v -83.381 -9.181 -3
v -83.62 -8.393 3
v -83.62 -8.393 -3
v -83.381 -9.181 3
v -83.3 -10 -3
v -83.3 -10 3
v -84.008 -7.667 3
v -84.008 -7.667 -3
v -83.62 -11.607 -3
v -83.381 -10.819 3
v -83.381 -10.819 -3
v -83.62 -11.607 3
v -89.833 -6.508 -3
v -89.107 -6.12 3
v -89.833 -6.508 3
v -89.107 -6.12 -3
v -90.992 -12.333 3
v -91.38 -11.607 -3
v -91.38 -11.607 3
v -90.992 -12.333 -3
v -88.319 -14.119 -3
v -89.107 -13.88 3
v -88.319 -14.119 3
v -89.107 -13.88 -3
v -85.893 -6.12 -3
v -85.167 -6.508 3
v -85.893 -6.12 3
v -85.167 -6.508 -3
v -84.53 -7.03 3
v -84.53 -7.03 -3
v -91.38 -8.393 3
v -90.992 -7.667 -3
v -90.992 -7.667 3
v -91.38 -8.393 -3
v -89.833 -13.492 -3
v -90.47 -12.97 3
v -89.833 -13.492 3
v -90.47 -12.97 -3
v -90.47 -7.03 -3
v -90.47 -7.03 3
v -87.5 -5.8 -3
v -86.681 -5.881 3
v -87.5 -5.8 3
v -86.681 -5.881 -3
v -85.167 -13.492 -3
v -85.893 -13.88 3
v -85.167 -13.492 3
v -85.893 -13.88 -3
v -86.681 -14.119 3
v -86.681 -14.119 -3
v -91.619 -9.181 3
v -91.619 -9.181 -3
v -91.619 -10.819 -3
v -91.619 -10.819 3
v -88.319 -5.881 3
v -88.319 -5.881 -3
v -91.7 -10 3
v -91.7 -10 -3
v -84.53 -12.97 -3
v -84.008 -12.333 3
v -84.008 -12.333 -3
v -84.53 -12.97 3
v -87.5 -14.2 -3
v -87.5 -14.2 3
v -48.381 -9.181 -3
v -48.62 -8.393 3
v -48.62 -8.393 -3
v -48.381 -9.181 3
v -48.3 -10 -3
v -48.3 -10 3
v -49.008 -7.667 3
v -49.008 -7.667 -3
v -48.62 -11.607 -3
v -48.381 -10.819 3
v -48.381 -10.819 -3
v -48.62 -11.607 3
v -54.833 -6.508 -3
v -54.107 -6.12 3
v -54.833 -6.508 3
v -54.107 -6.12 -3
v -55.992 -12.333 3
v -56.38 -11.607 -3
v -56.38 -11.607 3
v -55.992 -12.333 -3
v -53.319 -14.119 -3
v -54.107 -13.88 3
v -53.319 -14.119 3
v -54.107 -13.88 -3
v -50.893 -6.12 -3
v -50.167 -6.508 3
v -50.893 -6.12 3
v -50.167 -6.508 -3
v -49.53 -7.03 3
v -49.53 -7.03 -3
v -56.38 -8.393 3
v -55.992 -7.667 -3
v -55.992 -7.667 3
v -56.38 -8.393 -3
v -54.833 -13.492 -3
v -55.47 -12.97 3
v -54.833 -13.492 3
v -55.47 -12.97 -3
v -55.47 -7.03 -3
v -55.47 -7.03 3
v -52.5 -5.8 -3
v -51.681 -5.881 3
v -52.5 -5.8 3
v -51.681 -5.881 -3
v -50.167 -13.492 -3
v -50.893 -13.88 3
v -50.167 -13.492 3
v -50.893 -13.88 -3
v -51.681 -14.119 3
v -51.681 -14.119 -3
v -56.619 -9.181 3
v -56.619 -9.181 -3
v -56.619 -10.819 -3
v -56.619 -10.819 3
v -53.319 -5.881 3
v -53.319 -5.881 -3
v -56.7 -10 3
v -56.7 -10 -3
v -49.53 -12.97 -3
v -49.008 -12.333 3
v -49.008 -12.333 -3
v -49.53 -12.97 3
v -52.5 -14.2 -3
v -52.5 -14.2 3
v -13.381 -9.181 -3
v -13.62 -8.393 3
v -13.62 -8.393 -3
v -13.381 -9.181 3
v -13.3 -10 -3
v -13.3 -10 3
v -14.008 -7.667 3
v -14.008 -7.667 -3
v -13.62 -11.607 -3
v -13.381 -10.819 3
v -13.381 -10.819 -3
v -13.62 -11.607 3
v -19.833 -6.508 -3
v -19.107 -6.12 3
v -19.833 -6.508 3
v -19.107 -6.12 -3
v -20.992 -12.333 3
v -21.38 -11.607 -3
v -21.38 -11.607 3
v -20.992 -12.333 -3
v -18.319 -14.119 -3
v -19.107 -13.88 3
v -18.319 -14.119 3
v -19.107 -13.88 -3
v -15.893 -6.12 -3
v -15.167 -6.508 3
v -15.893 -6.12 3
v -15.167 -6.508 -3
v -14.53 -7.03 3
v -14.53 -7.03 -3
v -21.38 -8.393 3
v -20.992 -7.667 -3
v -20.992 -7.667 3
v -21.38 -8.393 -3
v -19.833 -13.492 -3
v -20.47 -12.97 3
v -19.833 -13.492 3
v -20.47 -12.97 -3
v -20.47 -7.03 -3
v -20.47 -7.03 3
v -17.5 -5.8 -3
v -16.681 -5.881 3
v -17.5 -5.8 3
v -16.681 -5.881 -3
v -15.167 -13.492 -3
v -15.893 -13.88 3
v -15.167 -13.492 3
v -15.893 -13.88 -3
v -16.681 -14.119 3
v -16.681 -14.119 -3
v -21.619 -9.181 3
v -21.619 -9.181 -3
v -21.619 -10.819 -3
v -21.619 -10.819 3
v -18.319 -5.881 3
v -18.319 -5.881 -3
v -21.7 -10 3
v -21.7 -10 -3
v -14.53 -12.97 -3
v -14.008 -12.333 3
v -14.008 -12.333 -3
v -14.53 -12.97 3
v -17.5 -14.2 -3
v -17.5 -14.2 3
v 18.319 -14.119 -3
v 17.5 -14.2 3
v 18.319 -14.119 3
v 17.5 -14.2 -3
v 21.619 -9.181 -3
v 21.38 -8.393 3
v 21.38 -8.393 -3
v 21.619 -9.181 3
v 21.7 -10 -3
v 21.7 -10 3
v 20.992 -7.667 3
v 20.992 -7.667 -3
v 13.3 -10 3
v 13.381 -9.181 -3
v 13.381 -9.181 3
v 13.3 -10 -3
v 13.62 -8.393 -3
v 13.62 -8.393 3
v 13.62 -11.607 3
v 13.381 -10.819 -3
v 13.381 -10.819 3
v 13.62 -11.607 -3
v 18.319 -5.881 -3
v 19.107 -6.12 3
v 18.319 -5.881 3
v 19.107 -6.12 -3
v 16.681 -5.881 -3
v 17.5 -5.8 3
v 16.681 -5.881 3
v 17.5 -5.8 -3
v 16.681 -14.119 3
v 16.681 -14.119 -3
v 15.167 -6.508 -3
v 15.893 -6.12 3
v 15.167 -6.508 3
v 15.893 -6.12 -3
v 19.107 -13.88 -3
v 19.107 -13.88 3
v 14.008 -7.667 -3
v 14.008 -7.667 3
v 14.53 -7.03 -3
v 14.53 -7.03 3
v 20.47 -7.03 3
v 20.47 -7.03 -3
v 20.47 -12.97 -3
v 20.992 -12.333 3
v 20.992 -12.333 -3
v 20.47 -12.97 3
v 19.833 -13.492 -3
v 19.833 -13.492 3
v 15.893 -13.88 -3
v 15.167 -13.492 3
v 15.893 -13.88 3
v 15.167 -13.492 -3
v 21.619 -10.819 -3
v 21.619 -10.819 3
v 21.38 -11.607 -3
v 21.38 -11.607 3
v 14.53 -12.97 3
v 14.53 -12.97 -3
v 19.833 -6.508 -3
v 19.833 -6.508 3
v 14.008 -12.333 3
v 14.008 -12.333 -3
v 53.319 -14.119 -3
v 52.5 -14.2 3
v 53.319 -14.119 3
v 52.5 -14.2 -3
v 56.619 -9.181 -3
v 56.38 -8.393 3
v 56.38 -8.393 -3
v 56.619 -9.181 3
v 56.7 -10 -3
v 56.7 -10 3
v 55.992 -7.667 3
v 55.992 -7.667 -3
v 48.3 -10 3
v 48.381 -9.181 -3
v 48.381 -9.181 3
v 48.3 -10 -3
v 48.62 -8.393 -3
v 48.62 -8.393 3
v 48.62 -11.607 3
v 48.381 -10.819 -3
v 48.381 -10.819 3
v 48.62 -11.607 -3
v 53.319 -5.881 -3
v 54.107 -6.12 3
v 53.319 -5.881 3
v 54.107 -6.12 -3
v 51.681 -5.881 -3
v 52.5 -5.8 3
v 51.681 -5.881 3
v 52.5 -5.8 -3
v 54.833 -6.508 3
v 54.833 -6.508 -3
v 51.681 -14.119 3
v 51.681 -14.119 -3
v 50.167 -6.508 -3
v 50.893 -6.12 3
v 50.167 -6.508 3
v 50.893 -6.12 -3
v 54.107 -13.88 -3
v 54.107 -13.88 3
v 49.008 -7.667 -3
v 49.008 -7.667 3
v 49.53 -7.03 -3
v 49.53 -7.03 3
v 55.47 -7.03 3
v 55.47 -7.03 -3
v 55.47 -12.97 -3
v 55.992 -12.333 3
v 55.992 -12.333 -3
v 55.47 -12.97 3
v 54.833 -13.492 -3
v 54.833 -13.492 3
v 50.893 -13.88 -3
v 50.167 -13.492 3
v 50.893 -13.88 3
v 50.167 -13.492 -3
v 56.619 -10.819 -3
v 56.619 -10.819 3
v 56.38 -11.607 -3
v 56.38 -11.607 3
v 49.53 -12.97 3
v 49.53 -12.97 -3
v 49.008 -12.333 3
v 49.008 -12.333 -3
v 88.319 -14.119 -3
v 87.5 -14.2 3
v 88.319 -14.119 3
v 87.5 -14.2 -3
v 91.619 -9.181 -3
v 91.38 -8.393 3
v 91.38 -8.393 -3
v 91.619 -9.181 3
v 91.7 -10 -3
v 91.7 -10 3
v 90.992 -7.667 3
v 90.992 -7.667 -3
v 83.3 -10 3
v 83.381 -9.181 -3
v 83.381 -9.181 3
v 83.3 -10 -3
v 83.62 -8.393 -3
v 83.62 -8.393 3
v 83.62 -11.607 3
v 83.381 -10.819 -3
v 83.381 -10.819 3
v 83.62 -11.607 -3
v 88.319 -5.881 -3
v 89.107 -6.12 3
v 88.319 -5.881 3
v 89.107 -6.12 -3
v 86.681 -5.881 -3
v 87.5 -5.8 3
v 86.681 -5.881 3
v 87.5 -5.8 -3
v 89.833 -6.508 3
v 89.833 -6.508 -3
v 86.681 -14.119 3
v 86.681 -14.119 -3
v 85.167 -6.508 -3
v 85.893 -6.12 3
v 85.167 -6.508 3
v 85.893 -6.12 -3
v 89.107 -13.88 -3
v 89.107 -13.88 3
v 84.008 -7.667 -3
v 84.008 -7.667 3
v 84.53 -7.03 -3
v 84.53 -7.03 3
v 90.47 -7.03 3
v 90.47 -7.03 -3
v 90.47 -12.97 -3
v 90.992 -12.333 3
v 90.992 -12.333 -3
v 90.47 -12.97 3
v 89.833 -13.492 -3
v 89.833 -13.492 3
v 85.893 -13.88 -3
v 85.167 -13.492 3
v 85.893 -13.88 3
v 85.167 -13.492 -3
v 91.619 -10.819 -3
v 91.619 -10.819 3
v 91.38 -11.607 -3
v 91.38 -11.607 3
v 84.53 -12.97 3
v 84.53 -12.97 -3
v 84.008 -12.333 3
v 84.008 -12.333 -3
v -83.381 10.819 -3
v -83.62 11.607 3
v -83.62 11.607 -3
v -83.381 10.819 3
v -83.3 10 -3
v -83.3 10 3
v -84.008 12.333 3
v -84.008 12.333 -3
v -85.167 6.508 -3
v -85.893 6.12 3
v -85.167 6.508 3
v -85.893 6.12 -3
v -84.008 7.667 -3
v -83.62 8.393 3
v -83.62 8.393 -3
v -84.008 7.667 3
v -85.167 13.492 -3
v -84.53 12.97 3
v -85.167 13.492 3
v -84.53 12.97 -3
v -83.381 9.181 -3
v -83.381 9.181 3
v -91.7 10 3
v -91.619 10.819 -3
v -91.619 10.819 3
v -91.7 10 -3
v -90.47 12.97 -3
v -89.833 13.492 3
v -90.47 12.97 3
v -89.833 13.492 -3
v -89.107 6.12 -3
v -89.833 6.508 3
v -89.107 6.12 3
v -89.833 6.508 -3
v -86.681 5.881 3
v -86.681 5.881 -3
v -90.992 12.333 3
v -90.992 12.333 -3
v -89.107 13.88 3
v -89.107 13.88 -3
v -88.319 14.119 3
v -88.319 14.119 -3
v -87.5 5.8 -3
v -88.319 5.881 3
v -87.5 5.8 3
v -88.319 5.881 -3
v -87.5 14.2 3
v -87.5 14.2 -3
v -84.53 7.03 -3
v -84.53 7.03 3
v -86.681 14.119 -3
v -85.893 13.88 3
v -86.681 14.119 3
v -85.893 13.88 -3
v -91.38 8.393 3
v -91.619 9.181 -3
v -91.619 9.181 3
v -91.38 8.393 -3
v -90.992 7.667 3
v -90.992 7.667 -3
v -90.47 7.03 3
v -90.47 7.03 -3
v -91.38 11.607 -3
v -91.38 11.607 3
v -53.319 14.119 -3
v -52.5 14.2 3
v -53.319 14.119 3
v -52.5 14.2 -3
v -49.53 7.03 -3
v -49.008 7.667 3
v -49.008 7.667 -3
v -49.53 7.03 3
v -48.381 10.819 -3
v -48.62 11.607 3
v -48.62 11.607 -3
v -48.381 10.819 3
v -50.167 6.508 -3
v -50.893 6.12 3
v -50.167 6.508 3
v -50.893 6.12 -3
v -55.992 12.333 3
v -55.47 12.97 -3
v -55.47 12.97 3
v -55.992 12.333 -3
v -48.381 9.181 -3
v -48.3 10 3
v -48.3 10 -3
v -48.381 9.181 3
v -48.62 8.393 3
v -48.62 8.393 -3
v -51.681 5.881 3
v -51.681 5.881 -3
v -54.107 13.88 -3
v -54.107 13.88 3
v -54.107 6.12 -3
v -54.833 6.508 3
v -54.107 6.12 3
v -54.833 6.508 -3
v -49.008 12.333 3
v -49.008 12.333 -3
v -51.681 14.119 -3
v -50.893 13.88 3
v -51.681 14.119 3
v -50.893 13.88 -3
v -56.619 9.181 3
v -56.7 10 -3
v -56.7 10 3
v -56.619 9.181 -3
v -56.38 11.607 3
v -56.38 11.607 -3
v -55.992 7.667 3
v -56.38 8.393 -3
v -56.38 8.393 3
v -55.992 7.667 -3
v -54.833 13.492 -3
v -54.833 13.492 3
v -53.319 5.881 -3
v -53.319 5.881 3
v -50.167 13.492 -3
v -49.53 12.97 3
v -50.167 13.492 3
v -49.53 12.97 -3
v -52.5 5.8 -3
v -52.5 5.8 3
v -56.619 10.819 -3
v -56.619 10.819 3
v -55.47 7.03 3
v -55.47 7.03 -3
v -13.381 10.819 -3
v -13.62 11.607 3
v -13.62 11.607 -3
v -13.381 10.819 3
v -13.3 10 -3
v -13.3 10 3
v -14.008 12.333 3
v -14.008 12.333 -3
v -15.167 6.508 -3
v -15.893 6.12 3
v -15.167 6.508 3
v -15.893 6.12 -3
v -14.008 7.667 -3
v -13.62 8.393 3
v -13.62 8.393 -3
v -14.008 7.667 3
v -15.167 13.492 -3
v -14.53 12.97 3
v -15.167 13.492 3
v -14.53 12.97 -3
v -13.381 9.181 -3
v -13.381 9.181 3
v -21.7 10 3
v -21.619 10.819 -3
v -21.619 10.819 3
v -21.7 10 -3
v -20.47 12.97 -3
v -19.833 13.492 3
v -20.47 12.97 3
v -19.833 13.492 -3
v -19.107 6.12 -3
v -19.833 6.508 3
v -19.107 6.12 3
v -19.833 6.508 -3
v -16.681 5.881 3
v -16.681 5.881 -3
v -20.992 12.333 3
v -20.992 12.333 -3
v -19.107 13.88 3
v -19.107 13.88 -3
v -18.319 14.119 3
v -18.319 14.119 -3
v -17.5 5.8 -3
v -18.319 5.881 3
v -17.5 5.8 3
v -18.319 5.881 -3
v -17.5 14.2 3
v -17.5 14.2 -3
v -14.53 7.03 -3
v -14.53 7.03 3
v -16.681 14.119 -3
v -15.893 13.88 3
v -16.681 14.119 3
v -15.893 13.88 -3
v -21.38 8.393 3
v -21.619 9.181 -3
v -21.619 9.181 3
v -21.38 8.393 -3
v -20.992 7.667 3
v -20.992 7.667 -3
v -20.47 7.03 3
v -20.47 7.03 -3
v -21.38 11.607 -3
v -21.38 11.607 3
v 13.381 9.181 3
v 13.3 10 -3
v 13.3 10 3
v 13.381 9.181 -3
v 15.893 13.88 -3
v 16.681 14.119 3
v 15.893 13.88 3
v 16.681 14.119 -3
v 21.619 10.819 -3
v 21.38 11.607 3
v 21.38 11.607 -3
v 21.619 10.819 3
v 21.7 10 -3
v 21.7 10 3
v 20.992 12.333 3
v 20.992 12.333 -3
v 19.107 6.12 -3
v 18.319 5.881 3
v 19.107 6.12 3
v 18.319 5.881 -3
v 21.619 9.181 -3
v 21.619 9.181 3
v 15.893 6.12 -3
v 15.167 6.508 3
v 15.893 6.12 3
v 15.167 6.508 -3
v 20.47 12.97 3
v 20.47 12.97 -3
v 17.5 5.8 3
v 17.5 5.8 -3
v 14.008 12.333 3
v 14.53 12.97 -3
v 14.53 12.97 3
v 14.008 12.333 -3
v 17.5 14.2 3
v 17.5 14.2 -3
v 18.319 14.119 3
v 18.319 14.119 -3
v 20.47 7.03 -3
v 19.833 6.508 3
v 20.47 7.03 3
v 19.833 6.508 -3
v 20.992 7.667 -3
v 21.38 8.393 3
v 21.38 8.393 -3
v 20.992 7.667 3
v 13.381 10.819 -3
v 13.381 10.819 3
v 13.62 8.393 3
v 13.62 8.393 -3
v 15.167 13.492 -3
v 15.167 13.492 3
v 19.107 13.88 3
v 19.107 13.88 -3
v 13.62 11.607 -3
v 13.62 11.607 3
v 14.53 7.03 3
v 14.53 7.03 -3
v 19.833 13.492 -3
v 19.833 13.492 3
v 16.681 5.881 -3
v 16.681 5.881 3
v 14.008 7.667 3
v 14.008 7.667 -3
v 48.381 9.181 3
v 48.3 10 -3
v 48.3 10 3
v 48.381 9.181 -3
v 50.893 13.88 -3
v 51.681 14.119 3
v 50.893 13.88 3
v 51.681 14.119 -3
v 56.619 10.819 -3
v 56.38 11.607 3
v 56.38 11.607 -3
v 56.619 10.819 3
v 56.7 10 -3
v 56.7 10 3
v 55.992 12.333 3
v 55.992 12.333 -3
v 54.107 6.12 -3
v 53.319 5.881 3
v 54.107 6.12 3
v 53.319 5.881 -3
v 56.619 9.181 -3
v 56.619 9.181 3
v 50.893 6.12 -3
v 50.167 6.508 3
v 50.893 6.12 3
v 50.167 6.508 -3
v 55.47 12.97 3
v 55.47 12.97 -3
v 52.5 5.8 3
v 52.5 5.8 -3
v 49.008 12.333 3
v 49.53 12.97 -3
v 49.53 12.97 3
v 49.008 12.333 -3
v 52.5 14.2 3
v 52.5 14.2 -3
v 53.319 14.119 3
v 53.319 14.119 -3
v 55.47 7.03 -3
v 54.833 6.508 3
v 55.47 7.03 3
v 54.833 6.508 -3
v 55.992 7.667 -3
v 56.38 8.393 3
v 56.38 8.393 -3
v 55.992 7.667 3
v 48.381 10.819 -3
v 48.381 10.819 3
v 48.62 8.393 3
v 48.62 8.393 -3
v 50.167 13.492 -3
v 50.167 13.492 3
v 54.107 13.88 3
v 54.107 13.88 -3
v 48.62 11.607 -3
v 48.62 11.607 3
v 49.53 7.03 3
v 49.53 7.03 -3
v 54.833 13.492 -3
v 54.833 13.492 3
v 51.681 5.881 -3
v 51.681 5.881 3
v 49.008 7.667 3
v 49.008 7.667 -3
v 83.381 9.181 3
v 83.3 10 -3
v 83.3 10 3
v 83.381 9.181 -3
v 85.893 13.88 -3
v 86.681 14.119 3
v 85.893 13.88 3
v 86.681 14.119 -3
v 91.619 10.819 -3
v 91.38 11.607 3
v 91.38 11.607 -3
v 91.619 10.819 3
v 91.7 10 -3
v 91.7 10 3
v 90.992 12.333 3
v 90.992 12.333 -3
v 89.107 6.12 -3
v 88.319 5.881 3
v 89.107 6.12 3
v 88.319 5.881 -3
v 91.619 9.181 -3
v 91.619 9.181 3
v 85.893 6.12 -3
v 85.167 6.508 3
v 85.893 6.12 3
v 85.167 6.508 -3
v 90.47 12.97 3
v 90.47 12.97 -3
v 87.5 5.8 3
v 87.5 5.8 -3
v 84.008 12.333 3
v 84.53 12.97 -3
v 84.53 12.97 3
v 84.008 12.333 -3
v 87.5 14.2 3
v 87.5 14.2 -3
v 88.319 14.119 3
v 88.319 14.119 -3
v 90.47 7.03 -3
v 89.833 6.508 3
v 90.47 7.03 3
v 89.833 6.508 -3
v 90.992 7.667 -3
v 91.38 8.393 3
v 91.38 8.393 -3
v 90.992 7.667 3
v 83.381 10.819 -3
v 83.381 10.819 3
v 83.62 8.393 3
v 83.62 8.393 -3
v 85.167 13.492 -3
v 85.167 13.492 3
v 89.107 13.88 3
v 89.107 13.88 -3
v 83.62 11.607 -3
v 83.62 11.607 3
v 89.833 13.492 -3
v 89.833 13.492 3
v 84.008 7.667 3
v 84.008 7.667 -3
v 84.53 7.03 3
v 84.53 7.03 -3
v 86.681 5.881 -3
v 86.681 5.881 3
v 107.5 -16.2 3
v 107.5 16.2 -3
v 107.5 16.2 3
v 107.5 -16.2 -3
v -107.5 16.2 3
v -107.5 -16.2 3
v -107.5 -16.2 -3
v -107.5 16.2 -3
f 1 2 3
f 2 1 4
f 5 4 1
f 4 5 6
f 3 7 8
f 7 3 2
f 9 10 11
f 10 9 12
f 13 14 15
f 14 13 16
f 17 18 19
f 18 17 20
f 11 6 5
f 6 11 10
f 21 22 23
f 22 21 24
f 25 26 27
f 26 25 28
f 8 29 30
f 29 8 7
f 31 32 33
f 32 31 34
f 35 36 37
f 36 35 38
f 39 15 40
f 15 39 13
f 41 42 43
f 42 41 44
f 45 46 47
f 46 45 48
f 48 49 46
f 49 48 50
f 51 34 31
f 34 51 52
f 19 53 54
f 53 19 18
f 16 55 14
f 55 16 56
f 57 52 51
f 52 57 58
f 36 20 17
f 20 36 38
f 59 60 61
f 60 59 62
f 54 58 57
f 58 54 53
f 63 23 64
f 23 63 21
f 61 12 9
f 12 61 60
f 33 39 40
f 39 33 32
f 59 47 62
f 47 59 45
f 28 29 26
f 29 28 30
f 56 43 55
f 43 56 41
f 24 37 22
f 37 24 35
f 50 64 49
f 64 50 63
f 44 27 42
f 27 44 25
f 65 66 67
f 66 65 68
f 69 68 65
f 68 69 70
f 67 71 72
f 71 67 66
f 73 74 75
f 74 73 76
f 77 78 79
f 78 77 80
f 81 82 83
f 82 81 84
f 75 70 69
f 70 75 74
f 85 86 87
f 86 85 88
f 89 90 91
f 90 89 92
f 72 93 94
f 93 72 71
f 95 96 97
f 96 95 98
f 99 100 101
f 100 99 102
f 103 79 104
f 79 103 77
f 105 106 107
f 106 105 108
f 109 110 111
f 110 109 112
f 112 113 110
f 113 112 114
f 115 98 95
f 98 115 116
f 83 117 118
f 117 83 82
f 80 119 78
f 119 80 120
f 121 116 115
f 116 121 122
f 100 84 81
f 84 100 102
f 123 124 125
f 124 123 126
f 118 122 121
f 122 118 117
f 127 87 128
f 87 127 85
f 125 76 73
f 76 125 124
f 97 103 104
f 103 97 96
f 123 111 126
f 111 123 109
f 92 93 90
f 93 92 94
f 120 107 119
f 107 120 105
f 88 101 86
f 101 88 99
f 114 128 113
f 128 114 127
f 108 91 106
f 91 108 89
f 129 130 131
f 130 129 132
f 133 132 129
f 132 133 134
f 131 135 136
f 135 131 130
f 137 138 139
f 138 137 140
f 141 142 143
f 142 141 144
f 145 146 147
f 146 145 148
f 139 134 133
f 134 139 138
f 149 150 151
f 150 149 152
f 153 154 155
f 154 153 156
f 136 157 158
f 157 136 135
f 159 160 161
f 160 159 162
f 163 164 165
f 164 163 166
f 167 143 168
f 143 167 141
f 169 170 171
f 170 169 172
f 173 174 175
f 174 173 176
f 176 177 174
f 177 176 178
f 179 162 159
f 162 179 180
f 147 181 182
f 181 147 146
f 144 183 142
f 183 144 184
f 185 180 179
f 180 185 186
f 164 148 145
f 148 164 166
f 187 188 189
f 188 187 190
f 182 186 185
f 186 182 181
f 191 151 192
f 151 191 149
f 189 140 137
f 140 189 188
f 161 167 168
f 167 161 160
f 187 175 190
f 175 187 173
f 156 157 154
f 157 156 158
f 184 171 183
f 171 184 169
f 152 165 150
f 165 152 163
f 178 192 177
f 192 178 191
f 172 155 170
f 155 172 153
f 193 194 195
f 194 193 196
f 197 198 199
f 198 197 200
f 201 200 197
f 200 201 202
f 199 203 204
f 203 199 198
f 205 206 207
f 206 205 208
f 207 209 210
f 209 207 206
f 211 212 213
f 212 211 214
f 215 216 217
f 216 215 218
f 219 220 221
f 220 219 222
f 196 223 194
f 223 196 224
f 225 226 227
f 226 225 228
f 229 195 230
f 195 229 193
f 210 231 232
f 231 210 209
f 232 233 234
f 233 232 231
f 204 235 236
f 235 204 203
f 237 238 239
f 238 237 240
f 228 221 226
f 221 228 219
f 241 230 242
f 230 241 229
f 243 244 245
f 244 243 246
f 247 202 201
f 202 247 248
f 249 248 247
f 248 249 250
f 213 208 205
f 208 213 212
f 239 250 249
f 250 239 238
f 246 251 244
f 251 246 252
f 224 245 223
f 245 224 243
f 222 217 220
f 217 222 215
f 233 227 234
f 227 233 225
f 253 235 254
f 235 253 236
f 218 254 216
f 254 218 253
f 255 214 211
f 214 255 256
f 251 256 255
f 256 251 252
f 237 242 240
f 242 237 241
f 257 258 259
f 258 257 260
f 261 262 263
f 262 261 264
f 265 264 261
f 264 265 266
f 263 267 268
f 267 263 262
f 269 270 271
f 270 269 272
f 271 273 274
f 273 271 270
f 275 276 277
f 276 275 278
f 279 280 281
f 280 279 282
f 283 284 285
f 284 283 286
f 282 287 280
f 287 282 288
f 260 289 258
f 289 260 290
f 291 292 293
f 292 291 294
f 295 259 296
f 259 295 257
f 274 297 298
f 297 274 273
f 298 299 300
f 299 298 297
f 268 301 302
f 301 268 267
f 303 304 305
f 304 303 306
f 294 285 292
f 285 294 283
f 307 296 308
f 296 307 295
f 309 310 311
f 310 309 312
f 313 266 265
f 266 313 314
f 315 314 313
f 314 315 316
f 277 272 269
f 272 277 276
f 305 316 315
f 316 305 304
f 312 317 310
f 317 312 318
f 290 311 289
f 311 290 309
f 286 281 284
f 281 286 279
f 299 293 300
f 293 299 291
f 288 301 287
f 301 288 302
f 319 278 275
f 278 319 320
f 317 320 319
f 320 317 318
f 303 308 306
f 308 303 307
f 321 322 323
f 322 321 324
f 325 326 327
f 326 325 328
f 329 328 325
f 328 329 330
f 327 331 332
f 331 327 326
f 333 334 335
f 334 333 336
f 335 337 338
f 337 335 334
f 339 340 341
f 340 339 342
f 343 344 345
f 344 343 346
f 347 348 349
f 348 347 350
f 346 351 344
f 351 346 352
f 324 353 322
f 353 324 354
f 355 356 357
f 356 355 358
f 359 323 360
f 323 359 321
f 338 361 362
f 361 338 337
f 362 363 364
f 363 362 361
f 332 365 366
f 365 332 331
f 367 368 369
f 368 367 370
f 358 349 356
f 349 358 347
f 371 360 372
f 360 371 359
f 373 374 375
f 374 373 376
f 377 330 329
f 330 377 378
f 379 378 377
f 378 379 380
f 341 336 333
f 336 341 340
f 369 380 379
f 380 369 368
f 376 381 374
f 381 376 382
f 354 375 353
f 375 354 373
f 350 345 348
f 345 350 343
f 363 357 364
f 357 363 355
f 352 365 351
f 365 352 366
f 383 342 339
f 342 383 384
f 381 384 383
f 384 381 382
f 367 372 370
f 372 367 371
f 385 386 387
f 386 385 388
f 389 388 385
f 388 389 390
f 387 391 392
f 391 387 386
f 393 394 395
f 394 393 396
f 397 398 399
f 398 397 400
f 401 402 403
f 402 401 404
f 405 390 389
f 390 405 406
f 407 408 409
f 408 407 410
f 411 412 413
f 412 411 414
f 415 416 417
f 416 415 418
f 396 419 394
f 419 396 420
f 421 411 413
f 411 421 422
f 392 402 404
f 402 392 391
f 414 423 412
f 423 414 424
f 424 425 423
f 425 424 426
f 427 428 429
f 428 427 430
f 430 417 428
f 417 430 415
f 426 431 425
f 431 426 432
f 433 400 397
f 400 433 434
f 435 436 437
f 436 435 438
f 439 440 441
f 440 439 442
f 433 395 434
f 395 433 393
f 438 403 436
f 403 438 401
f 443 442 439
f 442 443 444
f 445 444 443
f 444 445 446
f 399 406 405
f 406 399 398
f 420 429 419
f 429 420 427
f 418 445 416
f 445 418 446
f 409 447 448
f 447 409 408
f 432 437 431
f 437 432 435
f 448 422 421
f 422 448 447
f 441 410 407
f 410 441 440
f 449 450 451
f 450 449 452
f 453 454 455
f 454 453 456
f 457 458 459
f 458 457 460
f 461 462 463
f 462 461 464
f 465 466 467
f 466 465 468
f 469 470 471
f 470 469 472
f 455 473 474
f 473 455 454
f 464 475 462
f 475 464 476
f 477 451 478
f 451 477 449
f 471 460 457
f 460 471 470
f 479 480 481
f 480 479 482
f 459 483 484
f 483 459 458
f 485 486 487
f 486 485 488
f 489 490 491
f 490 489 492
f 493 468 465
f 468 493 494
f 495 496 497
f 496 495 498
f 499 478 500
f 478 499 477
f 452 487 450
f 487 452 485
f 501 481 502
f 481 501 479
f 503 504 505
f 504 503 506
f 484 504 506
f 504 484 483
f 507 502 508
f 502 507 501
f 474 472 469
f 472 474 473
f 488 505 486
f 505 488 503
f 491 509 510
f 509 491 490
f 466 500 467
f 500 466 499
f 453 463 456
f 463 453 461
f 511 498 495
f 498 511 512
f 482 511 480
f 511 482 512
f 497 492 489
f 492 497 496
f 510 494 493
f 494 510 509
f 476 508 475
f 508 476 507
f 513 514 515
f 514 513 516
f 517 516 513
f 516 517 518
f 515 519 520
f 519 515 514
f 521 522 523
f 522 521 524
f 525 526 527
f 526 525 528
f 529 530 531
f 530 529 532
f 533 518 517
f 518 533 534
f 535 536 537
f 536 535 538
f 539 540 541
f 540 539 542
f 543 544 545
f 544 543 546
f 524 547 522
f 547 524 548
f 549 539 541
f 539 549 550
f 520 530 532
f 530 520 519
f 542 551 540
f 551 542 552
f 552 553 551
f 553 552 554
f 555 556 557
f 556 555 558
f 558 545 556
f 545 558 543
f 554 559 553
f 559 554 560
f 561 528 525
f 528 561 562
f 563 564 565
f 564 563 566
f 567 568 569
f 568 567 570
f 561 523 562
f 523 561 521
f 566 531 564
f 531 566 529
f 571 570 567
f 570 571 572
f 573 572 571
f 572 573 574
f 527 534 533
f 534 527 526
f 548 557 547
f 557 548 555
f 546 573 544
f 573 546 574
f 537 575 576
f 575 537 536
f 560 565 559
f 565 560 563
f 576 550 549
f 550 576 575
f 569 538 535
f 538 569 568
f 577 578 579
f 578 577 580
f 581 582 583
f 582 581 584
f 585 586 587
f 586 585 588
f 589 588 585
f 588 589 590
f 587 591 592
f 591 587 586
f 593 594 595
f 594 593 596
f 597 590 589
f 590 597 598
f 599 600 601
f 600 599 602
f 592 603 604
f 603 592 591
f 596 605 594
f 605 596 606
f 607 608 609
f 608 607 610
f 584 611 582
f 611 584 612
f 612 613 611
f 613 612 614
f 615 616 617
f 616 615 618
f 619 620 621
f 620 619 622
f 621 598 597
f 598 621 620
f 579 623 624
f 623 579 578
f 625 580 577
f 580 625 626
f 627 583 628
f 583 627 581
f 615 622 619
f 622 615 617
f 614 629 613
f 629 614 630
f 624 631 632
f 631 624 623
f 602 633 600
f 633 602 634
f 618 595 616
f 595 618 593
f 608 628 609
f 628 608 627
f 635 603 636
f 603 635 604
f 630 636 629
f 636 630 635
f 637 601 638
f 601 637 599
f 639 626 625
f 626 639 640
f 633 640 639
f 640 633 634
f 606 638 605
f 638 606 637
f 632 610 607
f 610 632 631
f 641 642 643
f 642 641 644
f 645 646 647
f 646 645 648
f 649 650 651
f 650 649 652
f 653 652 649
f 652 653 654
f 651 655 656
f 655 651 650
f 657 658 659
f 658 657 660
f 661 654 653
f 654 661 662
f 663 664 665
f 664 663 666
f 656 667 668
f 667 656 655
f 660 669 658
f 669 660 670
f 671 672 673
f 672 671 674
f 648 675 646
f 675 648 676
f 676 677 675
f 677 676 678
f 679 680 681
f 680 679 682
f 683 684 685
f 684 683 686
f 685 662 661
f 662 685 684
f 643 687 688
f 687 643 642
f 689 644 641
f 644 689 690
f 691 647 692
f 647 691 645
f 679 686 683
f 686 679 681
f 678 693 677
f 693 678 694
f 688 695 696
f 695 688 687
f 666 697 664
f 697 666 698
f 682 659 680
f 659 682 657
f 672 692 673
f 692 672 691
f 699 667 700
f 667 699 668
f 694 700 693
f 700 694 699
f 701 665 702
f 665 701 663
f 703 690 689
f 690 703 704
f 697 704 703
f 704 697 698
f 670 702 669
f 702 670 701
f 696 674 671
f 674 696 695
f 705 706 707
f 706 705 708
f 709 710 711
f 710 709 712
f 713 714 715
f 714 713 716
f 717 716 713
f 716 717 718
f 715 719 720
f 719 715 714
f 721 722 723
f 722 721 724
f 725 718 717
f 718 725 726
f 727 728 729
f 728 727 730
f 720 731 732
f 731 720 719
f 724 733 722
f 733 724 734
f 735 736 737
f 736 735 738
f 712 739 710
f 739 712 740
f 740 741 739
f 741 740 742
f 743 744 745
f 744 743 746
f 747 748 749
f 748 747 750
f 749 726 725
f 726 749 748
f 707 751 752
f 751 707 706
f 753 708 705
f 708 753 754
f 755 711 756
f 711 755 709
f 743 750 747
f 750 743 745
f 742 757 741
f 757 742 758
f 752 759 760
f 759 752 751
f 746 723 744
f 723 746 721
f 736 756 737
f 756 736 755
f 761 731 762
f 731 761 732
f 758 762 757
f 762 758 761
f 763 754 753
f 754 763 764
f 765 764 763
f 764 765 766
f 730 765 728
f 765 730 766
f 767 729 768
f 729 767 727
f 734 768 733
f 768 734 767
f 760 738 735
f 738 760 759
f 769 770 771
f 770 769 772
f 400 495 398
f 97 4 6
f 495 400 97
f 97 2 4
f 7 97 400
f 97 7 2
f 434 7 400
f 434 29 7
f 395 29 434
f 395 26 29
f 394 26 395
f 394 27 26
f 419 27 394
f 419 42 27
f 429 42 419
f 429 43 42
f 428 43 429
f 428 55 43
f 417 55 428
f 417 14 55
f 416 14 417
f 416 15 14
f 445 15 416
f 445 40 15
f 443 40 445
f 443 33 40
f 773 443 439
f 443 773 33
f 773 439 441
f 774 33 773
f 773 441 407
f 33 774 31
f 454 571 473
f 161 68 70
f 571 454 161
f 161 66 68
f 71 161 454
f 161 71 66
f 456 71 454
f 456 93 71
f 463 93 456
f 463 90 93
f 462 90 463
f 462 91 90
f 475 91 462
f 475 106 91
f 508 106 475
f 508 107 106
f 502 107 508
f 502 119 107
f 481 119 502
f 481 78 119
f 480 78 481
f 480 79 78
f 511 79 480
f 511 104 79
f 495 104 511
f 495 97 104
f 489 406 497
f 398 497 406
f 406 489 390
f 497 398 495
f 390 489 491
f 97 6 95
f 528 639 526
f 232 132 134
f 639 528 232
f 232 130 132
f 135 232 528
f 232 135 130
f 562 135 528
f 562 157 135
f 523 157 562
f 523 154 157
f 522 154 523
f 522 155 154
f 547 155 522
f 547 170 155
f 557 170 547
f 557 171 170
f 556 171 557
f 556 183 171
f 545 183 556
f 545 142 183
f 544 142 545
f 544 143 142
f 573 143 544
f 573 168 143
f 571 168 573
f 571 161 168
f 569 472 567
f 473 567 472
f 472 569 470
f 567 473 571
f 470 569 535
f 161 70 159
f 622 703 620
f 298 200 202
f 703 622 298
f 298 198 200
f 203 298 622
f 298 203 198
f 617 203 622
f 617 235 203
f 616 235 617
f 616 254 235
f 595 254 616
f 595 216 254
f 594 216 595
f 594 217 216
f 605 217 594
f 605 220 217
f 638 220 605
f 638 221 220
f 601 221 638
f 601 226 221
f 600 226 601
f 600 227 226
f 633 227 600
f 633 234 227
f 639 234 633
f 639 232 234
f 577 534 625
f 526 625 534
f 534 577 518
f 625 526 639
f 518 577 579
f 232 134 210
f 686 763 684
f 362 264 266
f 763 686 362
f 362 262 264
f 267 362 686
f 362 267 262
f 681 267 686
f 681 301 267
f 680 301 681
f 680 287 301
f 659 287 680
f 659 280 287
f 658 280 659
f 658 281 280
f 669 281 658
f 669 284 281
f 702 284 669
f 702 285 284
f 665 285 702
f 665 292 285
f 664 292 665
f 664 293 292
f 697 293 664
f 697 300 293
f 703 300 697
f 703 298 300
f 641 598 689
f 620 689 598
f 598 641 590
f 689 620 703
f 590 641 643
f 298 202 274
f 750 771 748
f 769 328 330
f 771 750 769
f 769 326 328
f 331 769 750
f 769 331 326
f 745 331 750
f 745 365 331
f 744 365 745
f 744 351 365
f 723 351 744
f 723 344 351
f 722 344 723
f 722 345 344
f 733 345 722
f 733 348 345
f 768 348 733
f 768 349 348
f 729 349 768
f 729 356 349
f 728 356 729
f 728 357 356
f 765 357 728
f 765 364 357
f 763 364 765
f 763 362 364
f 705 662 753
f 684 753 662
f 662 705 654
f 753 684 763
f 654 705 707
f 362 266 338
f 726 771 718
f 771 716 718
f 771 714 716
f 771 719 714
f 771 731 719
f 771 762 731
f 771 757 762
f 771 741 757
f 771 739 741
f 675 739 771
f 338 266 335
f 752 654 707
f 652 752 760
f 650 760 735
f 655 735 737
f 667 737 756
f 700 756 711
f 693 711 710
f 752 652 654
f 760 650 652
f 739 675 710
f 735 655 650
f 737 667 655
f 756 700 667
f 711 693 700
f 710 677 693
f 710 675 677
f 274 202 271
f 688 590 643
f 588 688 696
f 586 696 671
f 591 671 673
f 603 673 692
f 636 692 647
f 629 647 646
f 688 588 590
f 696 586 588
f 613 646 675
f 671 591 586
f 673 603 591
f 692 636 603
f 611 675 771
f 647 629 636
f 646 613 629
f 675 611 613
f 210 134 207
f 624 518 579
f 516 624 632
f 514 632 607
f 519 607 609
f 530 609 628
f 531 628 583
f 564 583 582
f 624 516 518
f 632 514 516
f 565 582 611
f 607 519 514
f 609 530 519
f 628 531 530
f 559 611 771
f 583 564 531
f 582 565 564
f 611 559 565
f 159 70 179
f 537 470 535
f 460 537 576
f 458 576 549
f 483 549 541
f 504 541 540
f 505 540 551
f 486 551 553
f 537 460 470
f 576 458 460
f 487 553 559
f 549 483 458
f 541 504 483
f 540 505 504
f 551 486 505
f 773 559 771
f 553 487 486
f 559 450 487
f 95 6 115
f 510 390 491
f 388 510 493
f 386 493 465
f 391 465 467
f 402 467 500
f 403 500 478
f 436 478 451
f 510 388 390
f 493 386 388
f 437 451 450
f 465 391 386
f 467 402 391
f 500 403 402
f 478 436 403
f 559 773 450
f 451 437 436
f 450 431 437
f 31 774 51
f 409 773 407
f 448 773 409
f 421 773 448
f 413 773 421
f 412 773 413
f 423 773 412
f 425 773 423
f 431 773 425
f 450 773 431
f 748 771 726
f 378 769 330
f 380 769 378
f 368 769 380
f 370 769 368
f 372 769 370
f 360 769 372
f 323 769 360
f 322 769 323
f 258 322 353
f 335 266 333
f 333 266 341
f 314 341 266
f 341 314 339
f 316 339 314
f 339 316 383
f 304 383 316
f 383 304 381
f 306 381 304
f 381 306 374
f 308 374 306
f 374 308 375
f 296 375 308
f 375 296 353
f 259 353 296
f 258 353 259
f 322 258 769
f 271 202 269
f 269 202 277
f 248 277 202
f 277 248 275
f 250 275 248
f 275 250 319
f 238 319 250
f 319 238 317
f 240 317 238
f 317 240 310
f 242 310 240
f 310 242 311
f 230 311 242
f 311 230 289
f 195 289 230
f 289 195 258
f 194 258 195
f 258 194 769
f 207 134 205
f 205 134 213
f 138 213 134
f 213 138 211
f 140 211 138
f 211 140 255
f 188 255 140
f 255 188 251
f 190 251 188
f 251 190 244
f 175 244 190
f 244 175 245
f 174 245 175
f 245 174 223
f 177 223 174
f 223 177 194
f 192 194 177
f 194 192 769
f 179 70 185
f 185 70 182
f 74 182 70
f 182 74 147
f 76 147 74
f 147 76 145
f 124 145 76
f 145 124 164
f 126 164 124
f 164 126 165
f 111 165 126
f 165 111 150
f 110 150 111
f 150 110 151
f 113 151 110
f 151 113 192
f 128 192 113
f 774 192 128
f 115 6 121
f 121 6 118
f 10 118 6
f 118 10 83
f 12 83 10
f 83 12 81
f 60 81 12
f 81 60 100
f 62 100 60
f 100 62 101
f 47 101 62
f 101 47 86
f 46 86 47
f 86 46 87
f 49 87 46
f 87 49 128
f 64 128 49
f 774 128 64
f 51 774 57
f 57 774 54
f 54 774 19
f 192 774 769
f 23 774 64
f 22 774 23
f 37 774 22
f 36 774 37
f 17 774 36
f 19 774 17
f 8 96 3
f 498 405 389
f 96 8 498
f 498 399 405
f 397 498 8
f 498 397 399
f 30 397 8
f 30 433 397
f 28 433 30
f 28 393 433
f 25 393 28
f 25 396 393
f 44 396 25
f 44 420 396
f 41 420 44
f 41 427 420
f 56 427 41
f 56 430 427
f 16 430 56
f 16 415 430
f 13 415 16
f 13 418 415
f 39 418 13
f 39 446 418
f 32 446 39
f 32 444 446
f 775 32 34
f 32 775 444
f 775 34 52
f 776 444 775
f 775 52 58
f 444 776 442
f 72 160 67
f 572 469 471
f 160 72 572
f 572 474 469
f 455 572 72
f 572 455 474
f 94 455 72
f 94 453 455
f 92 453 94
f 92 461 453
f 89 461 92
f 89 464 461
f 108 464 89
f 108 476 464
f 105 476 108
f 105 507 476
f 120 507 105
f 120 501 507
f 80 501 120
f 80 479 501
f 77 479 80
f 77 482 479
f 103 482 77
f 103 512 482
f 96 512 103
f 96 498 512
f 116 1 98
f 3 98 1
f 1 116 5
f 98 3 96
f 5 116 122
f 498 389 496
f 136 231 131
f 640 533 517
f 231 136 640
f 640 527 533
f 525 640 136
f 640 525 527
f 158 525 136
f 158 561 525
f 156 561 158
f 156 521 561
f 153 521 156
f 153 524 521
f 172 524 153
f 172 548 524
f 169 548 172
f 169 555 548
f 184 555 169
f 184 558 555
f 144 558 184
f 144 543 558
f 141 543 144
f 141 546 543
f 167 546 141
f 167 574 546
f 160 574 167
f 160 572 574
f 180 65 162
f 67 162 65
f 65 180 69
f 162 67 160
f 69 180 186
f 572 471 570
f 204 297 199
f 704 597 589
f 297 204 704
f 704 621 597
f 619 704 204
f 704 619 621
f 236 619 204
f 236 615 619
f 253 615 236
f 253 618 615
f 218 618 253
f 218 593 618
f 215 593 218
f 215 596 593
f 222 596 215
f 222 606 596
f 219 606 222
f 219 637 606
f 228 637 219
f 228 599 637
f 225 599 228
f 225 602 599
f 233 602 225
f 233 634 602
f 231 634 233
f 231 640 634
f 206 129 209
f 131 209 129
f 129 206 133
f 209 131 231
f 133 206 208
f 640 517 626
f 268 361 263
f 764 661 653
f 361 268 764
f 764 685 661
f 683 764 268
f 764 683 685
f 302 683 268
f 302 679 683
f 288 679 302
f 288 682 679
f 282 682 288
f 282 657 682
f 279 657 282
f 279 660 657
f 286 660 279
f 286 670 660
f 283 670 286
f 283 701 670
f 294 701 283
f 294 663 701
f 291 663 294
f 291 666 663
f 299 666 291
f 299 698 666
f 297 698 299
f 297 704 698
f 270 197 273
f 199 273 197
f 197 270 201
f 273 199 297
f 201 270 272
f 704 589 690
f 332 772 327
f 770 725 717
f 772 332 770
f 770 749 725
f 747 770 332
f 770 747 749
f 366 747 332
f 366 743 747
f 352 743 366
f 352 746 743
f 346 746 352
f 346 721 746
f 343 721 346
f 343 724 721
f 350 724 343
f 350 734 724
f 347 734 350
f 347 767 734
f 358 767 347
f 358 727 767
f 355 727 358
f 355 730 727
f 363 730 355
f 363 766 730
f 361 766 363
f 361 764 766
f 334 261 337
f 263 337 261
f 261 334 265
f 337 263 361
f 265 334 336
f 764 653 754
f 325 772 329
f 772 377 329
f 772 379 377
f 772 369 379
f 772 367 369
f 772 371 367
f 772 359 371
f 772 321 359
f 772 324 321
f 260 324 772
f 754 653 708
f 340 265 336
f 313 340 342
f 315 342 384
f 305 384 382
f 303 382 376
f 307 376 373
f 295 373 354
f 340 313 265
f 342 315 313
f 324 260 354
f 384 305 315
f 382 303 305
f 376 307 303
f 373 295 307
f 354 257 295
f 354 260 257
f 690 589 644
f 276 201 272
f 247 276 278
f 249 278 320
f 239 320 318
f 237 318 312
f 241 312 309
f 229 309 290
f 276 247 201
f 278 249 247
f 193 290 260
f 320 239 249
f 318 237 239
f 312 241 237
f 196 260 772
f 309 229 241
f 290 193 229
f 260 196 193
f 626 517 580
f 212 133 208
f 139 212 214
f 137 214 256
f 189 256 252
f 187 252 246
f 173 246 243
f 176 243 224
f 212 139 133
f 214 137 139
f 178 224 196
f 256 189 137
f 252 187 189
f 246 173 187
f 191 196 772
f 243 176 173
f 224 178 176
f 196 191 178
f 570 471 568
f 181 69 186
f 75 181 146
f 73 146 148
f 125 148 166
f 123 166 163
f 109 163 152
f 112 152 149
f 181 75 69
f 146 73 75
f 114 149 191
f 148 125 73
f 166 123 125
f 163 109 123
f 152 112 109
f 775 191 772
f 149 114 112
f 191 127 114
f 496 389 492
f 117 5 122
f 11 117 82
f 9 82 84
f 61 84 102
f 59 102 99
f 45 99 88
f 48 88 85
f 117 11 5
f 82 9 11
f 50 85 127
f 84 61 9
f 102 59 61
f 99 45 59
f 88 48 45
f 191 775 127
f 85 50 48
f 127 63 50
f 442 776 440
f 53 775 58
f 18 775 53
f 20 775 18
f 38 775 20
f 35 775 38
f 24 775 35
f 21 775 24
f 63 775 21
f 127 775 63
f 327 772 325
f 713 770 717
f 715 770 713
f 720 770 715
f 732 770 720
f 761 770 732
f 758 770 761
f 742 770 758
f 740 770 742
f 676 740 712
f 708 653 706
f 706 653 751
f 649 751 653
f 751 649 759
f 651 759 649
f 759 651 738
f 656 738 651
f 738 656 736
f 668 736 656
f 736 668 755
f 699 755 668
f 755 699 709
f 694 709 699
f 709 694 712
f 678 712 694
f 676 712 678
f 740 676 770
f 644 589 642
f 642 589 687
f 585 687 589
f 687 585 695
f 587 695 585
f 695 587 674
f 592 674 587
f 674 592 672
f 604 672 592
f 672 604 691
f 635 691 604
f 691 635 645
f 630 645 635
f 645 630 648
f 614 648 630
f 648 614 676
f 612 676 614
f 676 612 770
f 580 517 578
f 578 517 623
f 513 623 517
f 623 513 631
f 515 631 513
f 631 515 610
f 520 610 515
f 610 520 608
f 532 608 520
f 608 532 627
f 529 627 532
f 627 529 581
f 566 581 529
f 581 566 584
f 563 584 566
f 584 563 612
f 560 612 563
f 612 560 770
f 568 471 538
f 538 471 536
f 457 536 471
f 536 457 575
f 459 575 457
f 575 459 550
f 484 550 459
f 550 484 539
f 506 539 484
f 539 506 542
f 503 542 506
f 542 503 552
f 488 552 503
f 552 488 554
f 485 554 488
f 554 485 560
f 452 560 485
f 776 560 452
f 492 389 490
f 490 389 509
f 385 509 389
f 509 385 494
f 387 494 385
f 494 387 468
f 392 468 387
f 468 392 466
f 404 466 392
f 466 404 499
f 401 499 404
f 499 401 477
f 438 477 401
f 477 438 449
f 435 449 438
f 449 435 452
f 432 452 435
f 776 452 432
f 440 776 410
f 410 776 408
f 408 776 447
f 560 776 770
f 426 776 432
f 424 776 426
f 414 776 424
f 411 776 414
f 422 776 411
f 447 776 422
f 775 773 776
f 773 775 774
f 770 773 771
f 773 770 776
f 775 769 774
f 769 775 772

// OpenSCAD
$fn = 32;

// ----------------------------------------------------------------------
// Hole bar, 6 x Ø8.4
// tworows layout, 20 mm edge offset
// ----------------------------------------------------------------------

// --- parameters (mm) ---
bar_w = 32.4;     // bar width (Y)
bar_t = 6;        // bar thickness (Z)
holes = 6;        // holes per row
hole_d = 8.4;     // hole diameter
edge = 20;        // offset from the bar end to the first hole
pitch = 35;       // pitch between neighbouring holes
row_offset = 20;  // distance between the two rows

// --- derived feature positions (mm) ---
span = (holes - 1) * pitch;   // = 175   distance between the end holes
bar_l = span + 2 * edge;      // = 215   overall bar length
start_x = -bar_l / 2 + edge;  // = -87.5   X of the first hole
feature_centers = [
  [start_x + 0 * pitch, -row_offset / 2],
  [start_x + 1 * pitch, -row_offset / 2],
  [start_x + 2 * pitch, -row_offset / 2],
  [start_x + 3 * pitch, -row_offset / 2],
  [start_x + 4 * pitch, -row_offset / 2],
  [start_x + 5 * pitch, -row_offset / 2]
];   // hole centres of the first row
row2_centers = [
  [start_x + 0 * pitch, row_offset / 2],
  [start_x + 1 * pitch, row_offset / 2],
  [start_x + 2 * pitch, row_offset / 2],
  [start_x + 3 * pitch, row_offset / 2],
  [start_x + 4 * pitch, row_offset / 2],
  [start_x + 5 * pitch, row_offset / 2]
];   // hole centres of the second row

// bar with two rows of holes, both read from their own centre arrays
difference() {
  translate([-bar_l / 2, -bar_w / 2, -bar_t / 2]) cube([bar_l, bar_w, bar_t]);
  for (centre = feature_centers)
    translate([centre[0], centre[1], 0])
      cylinder(d = hole_d, h = bar_t + 2, center = true);
  for (centre = row2_centers)
    translate([centre[0], centre[1], 0])
      cylinder(d = hole_d, h = bar_t + 2, center = true);
}
